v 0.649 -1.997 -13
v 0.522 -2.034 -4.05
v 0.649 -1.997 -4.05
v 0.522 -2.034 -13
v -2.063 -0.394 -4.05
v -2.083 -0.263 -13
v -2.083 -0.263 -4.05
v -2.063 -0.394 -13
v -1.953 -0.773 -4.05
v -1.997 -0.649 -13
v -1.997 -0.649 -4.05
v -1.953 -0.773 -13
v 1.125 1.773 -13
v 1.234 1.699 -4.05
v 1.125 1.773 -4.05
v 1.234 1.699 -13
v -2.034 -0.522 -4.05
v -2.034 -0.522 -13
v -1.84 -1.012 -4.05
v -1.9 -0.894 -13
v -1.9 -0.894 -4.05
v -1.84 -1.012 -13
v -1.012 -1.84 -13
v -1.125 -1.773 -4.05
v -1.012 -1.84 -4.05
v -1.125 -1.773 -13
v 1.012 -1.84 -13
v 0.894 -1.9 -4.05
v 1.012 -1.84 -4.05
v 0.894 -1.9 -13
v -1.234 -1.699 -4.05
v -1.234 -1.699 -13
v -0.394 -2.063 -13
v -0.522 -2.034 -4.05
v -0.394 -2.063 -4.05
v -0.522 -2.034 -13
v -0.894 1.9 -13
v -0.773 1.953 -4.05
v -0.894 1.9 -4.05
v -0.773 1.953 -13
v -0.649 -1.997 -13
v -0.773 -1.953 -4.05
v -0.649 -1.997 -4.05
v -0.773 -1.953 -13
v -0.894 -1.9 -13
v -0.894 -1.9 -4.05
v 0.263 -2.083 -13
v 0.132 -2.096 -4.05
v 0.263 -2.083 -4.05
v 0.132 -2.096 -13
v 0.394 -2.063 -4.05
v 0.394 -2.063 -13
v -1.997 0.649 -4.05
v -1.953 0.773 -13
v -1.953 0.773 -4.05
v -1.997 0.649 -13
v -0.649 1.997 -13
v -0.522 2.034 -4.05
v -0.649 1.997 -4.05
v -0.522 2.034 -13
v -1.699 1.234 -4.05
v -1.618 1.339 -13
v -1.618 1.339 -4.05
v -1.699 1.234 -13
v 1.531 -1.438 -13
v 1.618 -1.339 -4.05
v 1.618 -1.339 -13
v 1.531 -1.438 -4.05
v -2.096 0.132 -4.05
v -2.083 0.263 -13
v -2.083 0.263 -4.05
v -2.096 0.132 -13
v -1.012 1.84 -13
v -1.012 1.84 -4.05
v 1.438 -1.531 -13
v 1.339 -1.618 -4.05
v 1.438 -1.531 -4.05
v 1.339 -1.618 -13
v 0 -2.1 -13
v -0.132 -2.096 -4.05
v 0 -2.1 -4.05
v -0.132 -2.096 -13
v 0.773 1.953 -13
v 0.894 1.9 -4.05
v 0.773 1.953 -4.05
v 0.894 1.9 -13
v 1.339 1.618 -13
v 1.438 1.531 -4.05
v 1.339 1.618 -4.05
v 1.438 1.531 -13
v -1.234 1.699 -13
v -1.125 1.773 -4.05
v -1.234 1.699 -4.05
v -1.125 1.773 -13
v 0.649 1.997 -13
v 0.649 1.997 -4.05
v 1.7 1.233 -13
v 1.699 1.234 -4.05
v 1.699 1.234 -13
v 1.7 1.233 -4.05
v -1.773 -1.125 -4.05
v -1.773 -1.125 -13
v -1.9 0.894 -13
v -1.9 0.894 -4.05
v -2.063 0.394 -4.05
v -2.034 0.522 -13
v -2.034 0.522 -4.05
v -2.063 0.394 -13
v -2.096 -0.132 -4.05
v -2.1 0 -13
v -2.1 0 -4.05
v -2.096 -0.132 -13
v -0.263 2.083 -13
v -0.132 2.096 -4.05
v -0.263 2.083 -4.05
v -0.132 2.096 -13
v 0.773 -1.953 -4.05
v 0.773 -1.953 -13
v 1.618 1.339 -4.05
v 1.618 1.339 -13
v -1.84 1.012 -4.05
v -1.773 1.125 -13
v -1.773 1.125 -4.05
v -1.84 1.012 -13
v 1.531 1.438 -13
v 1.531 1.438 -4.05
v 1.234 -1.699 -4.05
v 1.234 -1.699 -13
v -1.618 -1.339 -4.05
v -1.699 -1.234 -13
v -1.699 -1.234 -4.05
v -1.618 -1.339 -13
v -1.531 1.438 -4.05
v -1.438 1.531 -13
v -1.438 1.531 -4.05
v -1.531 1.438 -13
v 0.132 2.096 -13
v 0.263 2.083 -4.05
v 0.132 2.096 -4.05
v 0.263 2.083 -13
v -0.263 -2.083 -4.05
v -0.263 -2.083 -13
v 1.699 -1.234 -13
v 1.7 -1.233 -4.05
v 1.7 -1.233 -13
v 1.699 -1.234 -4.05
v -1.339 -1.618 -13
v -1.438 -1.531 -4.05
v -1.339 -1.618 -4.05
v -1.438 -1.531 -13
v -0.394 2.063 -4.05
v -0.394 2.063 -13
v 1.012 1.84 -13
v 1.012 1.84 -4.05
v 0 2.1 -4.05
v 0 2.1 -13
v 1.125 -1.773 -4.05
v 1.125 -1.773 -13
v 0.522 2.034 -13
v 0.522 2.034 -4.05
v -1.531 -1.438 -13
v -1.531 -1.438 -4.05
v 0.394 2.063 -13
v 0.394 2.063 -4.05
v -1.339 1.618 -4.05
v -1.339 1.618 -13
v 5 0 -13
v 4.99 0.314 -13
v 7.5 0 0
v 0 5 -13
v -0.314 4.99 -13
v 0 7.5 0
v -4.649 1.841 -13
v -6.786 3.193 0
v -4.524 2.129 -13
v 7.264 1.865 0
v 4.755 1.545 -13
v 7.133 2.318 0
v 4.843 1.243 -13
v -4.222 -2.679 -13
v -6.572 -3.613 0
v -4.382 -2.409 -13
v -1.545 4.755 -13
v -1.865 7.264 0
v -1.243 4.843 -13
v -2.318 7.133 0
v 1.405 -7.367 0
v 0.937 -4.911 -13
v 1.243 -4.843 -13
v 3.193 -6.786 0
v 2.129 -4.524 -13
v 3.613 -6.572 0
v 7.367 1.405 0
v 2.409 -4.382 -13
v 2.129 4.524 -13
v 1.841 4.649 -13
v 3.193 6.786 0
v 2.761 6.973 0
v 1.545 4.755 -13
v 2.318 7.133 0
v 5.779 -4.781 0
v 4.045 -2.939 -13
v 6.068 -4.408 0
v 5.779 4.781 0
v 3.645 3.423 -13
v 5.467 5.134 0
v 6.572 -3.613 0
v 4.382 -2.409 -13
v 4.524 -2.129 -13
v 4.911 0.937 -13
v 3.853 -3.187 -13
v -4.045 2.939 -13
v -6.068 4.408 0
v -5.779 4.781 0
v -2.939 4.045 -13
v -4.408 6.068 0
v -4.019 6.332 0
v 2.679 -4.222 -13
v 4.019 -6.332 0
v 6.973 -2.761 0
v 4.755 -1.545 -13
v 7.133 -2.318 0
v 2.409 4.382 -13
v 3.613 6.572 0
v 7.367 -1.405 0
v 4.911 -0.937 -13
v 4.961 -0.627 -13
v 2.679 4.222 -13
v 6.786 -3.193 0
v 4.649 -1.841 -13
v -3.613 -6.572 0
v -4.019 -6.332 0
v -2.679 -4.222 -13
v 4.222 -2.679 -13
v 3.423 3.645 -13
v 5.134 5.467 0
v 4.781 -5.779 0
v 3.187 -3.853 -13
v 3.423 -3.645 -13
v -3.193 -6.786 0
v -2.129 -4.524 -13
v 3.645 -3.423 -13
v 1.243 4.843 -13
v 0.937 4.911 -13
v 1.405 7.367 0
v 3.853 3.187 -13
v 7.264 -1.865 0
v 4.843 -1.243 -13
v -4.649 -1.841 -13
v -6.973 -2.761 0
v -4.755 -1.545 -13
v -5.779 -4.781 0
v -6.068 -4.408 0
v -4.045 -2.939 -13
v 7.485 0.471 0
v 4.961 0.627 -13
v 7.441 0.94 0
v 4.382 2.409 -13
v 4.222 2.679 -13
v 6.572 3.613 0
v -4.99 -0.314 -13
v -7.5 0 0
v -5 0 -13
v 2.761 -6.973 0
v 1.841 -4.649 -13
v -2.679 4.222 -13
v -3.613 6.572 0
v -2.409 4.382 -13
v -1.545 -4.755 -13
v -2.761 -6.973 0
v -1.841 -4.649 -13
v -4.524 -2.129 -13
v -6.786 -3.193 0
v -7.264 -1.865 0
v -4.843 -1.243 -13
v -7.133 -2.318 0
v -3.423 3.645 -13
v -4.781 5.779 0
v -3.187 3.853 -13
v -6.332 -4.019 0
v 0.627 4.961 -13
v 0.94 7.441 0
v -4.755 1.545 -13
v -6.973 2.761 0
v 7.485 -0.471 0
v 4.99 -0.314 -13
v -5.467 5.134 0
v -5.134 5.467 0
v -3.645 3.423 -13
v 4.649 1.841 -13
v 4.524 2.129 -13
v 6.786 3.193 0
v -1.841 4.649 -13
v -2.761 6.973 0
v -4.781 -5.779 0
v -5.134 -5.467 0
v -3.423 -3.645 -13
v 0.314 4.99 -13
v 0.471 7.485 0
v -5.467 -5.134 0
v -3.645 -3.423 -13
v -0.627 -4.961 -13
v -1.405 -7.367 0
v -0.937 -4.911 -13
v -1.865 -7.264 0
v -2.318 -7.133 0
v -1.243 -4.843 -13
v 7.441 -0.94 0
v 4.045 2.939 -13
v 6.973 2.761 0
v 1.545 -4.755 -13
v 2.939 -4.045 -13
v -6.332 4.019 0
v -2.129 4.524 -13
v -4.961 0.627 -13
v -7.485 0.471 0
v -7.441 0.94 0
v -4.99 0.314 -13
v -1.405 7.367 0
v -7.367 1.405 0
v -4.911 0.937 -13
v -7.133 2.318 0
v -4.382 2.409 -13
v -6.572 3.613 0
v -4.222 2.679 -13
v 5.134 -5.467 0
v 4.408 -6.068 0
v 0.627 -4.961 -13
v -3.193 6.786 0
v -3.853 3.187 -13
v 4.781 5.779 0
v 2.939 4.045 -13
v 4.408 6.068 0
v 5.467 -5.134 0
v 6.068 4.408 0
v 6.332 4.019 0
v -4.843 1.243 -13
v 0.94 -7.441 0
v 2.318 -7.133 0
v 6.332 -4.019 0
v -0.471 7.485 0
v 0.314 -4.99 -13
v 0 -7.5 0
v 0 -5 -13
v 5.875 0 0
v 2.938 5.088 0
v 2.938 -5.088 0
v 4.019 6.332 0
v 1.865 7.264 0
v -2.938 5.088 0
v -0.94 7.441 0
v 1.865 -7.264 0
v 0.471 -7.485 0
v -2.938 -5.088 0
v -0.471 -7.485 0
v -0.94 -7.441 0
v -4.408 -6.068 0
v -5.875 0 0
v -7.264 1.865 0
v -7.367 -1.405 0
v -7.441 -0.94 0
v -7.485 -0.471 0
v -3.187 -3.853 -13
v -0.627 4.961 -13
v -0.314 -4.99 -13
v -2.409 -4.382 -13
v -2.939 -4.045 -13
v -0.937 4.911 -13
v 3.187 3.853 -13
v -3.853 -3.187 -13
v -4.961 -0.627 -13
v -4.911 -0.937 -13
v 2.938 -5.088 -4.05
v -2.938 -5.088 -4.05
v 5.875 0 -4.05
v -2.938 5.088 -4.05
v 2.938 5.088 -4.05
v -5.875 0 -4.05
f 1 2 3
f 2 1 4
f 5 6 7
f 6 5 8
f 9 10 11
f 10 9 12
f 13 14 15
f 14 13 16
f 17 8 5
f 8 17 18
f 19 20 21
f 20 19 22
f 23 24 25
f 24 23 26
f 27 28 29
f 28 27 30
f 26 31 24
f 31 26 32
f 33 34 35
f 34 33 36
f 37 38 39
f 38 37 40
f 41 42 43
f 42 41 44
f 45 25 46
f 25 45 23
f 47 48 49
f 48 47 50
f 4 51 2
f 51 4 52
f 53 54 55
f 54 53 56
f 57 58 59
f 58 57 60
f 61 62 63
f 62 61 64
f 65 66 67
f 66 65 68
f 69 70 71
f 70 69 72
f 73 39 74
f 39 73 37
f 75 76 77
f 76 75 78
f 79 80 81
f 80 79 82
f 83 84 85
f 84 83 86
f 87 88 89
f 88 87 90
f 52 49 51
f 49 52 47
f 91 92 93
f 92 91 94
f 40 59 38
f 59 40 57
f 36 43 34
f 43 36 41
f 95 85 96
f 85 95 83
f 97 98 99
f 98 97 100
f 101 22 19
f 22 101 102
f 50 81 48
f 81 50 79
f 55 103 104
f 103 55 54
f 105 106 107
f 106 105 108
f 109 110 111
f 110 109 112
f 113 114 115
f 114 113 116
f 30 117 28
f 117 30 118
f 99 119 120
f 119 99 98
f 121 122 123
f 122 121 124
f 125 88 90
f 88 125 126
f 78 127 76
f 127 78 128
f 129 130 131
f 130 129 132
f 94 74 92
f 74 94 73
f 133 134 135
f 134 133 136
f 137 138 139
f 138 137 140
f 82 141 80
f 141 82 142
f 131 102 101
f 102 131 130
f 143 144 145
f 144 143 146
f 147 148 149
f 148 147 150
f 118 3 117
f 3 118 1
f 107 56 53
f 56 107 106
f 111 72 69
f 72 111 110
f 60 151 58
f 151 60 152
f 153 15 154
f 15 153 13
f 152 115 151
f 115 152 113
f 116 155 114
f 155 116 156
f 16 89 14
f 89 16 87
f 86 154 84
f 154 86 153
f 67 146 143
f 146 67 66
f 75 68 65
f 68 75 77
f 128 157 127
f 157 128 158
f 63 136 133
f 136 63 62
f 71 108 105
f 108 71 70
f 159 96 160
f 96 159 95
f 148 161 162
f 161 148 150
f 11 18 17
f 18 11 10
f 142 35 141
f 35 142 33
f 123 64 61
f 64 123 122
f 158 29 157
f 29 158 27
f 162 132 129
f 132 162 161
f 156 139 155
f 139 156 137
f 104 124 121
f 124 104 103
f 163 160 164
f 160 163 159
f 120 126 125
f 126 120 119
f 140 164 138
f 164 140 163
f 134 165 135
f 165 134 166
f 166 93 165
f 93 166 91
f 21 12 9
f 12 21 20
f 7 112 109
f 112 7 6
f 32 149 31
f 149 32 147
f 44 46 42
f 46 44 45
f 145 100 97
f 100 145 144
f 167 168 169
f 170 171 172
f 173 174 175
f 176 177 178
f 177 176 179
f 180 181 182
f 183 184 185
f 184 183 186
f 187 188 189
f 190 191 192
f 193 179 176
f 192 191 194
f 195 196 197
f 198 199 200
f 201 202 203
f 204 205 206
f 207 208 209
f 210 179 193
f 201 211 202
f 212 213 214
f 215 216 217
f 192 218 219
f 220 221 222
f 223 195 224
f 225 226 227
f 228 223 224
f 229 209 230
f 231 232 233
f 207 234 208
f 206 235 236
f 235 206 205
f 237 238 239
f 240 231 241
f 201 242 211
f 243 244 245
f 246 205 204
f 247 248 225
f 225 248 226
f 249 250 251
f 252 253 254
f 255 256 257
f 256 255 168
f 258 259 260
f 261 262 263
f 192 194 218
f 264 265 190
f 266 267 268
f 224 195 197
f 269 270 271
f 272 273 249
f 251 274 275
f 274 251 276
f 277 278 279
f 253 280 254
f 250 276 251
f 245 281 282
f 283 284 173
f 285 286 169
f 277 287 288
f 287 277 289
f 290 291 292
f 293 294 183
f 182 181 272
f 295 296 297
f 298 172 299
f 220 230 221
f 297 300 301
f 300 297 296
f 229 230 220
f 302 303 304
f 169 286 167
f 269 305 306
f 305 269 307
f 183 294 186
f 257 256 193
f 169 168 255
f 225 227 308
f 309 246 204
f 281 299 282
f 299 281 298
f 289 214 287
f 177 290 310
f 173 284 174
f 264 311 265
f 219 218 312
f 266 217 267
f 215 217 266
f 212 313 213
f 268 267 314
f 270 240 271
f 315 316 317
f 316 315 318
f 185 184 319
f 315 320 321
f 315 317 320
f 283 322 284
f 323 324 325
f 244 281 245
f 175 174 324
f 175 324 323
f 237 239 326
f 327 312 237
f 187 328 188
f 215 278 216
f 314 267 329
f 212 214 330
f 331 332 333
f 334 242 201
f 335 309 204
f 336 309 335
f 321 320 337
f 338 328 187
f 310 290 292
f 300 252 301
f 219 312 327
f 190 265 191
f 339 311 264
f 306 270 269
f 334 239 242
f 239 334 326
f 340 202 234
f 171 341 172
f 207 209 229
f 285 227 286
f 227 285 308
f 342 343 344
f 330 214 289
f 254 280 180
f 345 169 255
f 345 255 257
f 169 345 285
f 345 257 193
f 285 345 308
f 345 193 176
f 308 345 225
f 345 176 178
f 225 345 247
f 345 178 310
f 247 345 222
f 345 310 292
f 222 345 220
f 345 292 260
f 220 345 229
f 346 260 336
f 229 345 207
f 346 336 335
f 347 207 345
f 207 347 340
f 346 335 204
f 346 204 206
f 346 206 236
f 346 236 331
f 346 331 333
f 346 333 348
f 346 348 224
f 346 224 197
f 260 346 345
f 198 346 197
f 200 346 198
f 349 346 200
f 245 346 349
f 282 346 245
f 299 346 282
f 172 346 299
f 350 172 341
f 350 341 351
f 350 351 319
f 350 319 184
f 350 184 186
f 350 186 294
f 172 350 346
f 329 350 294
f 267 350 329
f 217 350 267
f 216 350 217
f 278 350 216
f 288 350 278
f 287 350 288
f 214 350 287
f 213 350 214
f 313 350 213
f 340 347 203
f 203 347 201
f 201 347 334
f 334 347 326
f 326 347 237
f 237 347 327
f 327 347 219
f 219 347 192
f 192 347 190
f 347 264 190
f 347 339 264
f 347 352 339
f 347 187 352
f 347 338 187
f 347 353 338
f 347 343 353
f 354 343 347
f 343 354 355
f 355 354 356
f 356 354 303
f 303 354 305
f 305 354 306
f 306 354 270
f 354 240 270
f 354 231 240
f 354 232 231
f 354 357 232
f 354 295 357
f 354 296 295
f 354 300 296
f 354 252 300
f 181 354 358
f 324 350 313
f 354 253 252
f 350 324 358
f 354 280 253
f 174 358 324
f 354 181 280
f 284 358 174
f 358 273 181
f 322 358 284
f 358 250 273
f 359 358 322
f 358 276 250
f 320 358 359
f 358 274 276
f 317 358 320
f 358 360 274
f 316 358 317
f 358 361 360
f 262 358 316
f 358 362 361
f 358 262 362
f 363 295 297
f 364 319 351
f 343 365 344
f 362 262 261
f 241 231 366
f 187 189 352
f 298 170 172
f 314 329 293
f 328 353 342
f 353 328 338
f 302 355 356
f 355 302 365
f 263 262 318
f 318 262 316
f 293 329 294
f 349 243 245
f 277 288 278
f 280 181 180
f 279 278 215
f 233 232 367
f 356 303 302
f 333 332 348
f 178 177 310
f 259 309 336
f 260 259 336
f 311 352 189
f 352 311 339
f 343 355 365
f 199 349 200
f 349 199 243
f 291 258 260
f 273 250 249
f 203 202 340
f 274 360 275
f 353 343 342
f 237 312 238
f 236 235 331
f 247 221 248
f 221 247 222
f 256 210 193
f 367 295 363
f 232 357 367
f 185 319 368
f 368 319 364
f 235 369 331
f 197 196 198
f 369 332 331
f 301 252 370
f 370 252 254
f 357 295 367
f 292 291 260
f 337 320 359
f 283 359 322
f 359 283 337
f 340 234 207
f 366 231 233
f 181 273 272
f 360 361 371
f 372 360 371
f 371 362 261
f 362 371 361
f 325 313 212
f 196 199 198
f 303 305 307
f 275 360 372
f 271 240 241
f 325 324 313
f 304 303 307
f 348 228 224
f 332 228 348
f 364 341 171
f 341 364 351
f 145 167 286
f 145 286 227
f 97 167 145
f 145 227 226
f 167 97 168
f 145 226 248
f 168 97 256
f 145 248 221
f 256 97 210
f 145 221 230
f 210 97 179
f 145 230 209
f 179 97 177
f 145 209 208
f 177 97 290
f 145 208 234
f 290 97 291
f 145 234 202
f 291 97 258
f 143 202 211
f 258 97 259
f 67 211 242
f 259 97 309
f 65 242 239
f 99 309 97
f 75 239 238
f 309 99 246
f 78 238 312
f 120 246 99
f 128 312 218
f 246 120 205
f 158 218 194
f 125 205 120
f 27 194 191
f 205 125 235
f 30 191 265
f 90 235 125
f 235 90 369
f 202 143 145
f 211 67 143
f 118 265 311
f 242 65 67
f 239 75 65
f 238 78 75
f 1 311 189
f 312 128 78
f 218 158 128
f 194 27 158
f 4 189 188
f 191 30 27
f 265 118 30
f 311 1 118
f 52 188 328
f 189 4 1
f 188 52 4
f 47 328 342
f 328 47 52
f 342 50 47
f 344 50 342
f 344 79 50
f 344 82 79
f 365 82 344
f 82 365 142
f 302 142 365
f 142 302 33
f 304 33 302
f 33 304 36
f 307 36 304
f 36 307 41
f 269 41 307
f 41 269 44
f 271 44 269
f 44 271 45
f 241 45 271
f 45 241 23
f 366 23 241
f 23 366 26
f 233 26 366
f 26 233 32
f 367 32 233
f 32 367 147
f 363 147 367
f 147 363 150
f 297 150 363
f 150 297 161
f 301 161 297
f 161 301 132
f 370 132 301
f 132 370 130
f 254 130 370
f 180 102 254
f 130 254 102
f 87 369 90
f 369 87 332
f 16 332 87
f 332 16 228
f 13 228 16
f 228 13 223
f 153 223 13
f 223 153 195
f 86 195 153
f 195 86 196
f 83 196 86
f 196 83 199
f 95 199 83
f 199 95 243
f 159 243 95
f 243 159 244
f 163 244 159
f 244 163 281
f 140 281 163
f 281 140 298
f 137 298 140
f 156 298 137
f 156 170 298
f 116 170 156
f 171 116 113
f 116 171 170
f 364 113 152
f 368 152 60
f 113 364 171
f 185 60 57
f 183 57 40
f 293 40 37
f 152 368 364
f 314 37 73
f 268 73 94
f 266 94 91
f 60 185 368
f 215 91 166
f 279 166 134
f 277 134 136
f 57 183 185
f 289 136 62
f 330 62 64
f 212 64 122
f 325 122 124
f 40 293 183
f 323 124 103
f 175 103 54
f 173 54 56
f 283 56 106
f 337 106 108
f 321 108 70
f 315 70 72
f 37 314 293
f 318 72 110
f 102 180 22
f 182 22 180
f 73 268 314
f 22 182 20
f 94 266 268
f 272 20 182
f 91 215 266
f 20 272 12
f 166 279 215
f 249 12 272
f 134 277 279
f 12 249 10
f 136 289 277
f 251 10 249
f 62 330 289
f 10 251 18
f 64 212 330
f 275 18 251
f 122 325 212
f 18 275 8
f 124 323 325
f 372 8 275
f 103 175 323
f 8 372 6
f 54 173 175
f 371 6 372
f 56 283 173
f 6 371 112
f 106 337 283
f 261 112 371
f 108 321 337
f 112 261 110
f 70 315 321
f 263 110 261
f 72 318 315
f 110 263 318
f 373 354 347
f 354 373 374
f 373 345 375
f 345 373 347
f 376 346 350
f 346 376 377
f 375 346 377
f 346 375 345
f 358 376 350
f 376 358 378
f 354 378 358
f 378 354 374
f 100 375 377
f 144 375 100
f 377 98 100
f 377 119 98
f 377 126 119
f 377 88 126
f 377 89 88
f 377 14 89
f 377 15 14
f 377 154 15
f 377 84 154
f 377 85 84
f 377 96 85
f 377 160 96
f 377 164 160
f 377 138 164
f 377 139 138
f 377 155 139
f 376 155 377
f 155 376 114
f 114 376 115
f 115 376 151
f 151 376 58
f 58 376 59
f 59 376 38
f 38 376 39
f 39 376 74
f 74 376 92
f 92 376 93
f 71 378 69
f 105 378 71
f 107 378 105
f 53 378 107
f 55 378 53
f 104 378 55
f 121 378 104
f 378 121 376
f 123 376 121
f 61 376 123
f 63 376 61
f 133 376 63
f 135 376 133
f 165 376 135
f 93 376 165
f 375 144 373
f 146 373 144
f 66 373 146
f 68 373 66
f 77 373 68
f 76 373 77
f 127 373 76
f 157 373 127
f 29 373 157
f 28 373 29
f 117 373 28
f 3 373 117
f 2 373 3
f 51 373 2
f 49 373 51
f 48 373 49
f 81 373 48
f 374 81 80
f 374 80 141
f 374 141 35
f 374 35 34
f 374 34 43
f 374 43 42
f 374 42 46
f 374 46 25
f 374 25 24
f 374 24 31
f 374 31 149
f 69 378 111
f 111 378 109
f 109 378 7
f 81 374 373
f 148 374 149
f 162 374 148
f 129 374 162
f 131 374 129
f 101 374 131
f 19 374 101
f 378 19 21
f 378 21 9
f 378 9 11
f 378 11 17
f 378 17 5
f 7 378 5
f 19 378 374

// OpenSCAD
$fn = $preview ? 30 : 100;

module shaft(h=6) {
	difference() {
		cylinder(h=h, d=4.2, center=true);
		translate([1 + 2 - 0.3, 0, 0])
			cube([2, 10, h + 1], center=true);
	}
}

difference() {
	h_shaft = 13;
	union() {
		translate([0, 0, -h_shaft / 2])
			cylinder(h=h_shaft, d1=10, d2=15, center=true);
	}
	translate([0, 0, -h_shaft / 2])
		shaft(h_shaft + 1);
	translate([0, 0, -2])
		cylinder(h=4.1, d=11.75, center=true, $fn=6);
}
